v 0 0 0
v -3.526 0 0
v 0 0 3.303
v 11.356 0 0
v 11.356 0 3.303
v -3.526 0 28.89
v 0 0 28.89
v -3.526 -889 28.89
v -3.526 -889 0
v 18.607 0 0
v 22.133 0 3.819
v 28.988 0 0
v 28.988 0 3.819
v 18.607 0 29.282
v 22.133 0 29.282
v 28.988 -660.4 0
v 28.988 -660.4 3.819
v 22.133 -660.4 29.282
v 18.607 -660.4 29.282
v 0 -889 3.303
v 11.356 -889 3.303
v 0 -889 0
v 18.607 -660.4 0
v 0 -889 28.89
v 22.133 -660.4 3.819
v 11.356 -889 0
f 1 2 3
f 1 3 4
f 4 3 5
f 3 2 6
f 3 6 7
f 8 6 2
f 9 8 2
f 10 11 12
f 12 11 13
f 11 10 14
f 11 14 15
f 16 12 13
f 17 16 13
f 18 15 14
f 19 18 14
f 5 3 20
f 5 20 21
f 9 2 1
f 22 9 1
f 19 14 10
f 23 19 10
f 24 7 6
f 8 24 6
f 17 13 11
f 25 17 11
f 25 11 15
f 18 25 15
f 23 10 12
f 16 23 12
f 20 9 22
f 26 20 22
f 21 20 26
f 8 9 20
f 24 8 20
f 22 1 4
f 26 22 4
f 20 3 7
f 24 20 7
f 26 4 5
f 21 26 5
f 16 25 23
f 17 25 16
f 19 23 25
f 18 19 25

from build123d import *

# Parameters (mm, degrees)
F0_W     = 11.356227
F0_H     = 3.303187
F1_DEPTH = 889
F3_DEPTH = 660.4


with BuildPart() as f1:
    # F0 (on Front) → F1 (new body)
    with BuildSketch(Plane.XZ):
        Polygon((-3.525533, 0), (0, 0), (0, 3.303187), (0, 28.889779), (-3.525533, 28.889779), align=None)
        with Locations((5.678113, 1.651593)):
            Rectangle(F0_W, F0_H)
    extrude(amount=F1_DEPTH)


with BuildPart() as f3:
    # F2 (on Front) → F3 (new body)
    with BuildSketch(Plane.XZ):
        Polygon((18.606978, 29.281506), (18.606978, 0), (28.987709, 0), (28.987709, 3.819327), (22.132508, 3.819327), (22.132508, 29.281506), align=None)
    extrude(amount=F3_DEPTH)


solid = Compound([f1.part, f3.part])
